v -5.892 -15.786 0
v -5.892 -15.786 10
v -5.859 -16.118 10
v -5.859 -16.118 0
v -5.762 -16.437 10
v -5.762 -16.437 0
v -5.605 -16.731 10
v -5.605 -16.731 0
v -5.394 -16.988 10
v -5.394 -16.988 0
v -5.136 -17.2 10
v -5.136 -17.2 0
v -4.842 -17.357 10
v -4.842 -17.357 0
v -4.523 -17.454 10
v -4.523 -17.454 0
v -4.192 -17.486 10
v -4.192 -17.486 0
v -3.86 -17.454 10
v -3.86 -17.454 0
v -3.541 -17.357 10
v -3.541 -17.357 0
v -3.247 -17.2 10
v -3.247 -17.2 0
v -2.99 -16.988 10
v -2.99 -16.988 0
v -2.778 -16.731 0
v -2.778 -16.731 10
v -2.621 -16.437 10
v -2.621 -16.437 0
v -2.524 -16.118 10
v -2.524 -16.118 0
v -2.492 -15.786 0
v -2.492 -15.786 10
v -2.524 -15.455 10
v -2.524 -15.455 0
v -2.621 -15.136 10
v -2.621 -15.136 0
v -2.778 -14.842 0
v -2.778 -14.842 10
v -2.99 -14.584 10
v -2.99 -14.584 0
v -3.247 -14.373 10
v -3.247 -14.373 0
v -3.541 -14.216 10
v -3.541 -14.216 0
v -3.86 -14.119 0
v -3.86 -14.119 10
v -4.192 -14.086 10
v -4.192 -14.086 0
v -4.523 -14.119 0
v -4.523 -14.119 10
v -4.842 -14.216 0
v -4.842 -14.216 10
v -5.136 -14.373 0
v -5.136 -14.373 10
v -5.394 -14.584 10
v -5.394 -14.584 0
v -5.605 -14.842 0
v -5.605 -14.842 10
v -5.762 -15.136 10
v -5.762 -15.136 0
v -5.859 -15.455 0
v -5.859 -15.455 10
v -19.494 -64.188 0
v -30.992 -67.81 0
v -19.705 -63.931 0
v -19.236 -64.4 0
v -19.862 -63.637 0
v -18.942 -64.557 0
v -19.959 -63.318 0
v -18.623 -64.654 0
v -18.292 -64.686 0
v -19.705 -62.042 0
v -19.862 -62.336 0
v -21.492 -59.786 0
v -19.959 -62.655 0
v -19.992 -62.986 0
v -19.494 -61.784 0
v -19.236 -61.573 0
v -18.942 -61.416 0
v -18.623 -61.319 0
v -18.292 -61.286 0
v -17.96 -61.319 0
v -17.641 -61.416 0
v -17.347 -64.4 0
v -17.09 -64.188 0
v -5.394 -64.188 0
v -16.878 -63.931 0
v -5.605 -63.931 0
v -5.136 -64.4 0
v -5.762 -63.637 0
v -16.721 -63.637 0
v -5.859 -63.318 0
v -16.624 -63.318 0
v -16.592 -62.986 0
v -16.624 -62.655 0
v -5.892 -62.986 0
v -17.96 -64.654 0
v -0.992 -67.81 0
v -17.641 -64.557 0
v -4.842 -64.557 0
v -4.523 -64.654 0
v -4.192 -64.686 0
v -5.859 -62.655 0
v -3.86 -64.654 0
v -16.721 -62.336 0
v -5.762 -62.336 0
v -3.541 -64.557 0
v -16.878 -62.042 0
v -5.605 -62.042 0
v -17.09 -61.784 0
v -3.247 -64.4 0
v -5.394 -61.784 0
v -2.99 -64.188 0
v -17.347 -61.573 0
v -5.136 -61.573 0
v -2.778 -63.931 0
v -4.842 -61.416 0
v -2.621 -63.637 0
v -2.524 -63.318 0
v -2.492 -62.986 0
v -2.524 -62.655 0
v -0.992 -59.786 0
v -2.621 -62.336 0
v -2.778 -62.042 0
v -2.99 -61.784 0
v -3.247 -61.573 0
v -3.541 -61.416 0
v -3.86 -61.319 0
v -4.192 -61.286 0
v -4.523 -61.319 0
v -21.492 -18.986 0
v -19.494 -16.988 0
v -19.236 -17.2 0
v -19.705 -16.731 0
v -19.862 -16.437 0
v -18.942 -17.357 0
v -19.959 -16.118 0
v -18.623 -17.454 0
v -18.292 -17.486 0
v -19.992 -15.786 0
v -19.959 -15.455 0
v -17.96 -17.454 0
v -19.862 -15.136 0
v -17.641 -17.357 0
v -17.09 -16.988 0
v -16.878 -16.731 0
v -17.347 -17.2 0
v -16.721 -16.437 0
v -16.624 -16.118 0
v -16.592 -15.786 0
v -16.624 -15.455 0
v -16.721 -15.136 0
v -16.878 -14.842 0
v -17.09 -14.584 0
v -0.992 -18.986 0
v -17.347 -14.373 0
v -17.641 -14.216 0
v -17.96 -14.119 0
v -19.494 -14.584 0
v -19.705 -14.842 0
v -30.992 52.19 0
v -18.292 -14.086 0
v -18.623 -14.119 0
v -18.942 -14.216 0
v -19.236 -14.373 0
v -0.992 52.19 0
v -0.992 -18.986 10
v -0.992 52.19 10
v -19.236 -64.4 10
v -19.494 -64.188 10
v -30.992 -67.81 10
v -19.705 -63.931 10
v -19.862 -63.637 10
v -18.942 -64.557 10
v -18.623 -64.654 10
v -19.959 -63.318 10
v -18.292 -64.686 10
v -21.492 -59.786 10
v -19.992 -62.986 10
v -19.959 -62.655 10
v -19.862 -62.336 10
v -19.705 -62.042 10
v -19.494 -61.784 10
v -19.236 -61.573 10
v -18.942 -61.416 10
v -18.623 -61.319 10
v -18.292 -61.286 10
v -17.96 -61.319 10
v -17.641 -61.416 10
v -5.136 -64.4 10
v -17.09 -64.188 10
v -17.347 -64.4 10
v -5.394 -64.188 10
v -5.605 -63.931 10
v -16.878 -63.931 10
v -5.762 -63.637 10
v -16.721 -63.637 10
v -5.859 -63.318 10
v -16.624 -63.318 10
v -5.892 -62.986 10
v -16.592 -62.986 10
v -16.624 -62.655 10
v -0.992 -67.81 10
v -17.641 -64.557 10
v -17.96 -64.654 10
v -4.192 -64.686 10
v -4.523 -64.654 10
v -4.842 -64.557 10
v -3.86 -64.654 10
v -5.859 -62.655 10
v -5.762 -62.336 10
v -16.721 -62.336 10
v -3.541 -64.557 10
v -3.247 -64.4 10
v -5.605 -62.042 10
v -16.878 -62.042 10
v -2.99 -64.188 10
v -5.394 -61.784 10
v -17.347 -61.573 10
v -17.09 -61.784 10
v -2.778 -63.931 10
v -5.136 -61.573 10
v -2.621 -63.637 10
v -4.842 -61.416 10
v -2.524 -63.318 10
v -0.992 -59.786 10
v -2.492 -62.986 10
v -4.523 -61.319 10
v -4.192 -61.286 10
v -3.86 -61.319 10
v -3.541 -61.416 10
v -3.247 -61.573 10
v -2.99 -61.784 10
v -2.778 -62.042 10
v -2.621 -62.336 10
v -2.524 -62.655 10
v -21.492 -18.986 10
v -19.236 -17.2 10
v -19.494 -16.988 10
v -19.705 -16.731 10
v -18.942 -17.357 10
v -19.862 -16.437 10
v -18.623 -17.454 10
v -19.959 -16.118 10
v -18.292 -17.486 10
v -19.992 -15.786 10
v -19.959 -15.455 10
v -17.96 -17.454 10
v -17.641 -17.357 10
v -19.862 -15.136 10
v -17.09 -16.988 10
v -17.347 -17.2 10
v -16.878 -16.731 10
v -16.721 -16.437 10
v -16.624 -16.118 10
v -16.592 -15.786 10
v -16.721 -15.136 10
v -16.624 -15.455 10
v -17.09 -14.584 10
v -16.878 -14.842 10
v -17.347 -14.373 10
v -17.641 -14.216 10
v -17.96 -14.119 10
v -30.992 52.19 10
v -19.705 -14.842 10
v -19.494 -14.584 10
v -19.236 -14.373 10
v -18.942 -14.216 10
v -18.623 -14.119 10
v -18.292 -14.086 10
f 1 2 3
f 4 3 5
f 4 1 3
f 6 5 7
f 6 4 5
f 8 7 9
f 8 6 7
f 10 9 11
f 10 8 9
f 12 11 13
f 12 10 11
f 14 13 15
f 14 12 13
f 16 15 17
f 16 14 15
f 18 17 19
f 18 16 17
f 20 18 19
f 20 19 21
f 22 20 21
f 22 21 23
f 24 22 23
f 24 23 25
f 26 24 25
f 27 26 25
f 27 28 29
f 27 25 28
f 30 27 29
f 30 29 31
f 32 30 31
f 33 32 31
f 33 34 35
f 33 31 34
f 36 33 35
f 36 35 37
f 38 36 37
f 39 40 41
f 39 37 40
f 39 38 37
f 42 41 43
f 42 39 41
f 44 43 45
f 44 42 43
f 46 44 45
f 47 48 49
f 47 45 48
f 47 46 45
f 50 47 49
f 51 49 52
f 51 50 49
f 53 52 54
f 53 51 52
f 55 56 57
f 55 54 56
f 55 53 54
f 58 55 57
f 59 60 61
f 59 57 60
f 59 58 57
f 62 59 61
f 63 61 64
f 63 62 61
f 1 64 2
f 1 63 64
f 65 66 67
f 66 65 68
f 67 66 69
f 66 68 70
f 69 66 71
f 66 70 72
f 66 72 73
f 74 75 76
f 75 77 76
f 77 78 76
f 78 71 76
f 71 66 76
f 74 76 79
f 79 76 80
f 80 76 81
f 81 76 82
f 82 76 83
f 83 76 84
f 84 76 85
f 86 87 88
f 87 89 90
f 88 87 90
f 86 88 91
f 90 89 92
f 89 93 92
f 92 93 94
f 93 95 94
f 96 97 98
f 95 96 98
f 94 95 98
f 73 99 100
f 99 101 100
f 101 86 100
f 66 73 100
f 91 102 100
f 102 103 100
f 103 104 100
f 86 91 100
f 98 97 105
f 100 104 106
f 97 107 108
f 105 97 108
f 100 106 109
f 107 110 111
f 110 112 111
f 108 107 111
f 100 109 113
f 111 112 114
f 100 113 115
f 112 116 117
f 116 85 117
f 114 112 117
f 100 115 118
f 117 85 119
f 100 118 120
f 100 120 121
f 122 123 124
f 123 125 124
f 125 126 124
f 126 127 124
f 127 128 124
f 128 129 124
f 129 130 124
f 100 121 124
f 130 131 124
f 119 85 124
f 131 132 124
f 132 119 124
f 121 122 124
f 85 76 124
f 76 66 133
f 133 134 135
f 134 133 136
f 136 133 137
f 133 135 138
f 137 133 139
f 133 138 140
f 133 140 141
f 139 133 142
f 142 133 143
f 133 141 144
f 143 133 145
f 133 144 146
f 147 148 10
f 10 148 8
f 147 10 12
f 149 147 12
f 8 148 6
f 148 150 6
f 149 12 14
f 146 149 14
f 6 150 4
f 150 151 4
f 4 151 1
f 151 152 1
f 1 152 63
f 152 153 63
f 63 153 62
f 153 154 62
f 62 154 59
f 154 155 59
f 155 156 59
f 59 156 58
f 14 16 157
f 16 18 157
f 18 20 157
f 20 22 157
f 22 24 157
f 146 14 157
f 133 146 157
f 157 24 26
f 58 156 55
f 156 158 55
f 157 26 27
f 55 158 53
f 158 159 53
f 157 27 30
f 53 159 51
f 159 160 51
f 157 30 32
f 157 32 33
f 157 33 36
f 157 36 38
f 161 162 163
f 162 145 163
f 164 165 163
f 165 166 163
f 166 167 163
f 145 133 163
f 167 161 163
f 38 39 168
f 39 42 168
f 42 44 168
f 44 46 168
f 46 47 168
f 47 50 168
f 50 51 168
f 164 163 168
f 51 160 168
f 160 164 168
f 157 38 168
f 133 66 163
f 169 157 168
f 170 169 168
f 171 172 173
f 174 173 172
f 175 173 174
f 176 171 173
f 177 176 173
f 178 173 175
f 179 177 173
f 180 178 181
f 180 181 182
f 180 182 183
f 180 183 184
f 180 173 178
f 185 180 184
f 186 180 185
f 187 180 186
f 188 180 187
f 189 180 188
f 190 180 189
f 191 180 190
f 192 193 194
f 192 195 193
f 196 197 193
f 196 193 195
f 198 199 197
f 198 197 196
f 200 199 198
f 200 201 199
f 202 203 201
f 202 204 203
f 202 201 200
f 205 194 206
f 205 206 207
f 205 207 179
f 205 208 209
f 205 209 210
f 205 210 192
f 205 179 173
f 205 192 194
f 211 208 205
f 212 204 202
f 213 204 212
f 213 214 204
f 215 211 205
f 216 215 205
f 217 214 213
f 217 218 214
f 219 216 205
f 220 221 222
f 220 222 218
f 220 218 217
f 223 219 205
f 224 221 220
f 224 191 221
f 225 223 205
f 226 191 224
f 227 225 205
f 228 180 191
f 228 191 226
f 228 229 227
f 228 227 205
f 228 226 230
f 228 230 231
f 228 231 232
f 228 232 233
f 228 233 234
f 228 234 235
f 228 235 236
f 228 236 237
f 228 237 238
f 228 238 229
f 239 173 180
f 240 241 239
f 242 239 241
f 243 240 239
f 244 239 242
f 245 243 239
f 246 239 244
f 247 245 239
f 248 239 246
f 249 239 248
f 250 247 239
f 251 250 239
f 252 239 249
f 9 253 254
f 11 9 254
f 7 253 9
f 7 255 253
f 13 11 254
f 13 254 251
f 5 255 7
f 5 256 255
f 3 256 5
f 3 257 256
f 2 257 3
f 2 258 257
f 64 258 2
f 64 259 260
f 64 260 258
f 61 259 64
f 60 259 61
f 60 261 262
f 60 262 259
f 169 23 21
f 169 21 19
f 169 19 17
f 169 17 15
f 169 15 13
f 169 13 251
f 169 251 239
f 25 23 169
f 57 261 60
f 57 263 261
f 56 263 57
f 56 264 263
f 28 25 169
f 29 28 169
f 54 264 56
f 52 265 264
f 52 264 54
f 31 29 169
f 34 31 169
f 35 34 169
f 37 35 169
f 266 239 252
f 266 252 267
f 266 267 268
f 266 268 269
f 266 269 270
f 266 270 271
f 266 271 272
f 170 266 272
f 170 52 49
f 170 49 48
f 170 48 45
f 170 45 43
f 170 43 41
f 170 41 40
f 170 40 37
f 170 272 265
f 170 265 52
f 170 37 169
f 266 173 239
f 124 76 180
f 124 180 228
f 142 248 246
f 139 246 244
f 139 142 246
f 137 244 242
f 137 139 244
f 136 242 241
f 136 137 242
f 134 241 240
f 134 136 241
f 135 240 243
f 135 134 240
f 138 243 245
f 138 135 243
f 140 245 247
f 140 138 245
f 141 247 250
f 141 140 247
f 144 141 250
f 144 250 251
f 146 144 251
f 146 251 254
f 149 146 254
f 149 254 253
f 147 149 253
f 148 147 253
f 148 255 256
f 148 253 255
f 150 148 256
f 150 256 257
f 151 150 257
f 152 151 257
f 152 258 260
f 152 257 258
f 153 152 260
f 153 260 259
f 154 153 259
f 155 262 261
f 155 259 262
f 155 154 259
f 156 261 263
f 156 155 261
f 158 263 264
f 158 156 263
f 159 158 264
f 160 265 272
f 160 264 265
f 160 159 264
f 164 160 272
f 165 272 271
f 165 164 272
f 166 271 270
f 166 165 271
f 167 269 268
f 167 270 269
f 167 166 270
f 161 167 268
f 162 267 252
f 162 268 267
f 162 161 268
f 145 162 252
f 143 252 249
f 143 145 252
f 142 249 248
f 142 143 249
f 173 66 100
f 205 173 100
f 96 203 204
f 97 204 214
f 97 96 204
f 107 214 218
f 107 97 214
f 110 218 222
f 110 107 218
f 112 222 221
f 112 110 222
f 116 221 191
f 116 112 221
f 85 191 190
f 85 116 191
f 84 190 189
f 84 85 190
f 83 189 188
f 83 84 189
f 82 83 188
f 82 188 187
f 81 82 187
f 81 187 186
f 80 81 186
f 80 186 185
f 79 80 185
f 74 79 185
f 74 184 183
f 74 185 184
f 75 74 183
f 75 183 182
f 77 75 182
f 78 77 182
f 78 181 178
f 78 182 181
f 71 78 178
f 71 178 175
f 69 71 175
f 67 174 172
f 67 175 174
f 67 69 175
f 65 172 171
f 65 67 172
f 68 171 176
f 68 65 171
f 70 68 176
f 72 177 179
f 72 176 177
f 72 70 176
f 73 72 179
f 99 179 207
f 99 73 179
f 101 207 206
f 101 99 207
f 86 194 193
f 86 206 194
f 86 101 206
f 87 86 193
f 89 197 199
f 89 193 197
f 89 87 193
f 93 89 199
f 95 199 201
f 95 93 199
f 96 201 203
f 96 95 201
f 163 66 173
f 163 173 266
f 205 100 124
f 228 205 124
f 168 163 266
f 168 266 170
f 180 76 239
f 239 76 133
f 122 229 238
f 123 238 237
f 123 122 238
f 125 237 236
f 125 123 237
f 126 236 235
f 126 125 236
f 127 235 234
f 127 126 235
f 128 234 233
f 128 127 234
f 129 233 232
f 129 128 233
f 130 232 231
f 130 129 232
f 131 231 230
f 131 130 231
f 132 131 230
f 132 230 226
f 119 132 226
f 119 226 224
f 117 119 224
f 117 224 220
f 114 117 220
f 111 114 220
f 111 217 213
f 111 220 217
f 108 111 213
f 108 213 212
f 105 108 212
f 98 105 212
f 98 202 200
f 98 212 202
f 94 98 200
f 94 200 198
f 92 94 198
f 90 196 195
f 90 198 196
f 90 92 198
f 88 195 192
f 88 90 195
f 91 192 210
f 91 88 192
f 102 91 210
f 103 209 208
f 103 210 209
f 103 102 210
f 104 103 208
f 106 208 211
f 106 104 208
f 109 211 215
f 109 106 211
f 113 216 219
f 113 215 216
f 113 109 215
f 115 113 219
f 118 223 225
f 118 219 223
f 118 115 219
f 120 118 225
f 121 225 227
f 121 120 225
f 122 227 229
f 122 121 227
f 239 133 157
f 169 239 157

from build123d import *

# Parameters (mm, degrees)
SKETCH2_W           = 30
SKETCH2_H           = 120
BOSS_EXTRUDE1_DEPTH = 10
SKETCH3_R           = 1.7
SKETCH3_W           = 20.5
SKETCH3_H           = 40.8
CUT_EXTRUDE3_DEPTH  = 76.224148804


with BuildPart() as part:
    # Sketch2 → Boss-Extrude1 (new body)
    with BuildSketch(Plane.XY):
        with Locations((-15.991735537, -7.809917355)):
            Rectangle(SKETCH2_W, SKETCH2_H)
    extrude(amount=BOSS_EXTRUDE1_DEPTH)

    # Sketch3 → Cut-Extrude3 (cut, through all)
    with BuildSketch(Plane.XY):
        with Locations((-18.291735537, -62.986209282)):
            Circle(SKETCH3_R)
        with Locations((-4.191735537, -62.986209282)):
            Circle(SKETCH3_R)
        with Locations(Location((-4.191735537, -15.786209282, 0), (0, 0, 180))):
            Circle(SKETCH3_R)
        with Locations(Location((-18.291735537, -15.786209282, 0), (0, 0, 180))):
            Circle(SKETCH3_R)
        with Locations((-11.241735537, -39.386209282)):
            Rectangle(SKETCH3_W, SKETCH3_H)
    extrude(amount=CUT_EXTRUDE3_DEPTH, mode=Mode.SUBTRACT)


solid = part.part
